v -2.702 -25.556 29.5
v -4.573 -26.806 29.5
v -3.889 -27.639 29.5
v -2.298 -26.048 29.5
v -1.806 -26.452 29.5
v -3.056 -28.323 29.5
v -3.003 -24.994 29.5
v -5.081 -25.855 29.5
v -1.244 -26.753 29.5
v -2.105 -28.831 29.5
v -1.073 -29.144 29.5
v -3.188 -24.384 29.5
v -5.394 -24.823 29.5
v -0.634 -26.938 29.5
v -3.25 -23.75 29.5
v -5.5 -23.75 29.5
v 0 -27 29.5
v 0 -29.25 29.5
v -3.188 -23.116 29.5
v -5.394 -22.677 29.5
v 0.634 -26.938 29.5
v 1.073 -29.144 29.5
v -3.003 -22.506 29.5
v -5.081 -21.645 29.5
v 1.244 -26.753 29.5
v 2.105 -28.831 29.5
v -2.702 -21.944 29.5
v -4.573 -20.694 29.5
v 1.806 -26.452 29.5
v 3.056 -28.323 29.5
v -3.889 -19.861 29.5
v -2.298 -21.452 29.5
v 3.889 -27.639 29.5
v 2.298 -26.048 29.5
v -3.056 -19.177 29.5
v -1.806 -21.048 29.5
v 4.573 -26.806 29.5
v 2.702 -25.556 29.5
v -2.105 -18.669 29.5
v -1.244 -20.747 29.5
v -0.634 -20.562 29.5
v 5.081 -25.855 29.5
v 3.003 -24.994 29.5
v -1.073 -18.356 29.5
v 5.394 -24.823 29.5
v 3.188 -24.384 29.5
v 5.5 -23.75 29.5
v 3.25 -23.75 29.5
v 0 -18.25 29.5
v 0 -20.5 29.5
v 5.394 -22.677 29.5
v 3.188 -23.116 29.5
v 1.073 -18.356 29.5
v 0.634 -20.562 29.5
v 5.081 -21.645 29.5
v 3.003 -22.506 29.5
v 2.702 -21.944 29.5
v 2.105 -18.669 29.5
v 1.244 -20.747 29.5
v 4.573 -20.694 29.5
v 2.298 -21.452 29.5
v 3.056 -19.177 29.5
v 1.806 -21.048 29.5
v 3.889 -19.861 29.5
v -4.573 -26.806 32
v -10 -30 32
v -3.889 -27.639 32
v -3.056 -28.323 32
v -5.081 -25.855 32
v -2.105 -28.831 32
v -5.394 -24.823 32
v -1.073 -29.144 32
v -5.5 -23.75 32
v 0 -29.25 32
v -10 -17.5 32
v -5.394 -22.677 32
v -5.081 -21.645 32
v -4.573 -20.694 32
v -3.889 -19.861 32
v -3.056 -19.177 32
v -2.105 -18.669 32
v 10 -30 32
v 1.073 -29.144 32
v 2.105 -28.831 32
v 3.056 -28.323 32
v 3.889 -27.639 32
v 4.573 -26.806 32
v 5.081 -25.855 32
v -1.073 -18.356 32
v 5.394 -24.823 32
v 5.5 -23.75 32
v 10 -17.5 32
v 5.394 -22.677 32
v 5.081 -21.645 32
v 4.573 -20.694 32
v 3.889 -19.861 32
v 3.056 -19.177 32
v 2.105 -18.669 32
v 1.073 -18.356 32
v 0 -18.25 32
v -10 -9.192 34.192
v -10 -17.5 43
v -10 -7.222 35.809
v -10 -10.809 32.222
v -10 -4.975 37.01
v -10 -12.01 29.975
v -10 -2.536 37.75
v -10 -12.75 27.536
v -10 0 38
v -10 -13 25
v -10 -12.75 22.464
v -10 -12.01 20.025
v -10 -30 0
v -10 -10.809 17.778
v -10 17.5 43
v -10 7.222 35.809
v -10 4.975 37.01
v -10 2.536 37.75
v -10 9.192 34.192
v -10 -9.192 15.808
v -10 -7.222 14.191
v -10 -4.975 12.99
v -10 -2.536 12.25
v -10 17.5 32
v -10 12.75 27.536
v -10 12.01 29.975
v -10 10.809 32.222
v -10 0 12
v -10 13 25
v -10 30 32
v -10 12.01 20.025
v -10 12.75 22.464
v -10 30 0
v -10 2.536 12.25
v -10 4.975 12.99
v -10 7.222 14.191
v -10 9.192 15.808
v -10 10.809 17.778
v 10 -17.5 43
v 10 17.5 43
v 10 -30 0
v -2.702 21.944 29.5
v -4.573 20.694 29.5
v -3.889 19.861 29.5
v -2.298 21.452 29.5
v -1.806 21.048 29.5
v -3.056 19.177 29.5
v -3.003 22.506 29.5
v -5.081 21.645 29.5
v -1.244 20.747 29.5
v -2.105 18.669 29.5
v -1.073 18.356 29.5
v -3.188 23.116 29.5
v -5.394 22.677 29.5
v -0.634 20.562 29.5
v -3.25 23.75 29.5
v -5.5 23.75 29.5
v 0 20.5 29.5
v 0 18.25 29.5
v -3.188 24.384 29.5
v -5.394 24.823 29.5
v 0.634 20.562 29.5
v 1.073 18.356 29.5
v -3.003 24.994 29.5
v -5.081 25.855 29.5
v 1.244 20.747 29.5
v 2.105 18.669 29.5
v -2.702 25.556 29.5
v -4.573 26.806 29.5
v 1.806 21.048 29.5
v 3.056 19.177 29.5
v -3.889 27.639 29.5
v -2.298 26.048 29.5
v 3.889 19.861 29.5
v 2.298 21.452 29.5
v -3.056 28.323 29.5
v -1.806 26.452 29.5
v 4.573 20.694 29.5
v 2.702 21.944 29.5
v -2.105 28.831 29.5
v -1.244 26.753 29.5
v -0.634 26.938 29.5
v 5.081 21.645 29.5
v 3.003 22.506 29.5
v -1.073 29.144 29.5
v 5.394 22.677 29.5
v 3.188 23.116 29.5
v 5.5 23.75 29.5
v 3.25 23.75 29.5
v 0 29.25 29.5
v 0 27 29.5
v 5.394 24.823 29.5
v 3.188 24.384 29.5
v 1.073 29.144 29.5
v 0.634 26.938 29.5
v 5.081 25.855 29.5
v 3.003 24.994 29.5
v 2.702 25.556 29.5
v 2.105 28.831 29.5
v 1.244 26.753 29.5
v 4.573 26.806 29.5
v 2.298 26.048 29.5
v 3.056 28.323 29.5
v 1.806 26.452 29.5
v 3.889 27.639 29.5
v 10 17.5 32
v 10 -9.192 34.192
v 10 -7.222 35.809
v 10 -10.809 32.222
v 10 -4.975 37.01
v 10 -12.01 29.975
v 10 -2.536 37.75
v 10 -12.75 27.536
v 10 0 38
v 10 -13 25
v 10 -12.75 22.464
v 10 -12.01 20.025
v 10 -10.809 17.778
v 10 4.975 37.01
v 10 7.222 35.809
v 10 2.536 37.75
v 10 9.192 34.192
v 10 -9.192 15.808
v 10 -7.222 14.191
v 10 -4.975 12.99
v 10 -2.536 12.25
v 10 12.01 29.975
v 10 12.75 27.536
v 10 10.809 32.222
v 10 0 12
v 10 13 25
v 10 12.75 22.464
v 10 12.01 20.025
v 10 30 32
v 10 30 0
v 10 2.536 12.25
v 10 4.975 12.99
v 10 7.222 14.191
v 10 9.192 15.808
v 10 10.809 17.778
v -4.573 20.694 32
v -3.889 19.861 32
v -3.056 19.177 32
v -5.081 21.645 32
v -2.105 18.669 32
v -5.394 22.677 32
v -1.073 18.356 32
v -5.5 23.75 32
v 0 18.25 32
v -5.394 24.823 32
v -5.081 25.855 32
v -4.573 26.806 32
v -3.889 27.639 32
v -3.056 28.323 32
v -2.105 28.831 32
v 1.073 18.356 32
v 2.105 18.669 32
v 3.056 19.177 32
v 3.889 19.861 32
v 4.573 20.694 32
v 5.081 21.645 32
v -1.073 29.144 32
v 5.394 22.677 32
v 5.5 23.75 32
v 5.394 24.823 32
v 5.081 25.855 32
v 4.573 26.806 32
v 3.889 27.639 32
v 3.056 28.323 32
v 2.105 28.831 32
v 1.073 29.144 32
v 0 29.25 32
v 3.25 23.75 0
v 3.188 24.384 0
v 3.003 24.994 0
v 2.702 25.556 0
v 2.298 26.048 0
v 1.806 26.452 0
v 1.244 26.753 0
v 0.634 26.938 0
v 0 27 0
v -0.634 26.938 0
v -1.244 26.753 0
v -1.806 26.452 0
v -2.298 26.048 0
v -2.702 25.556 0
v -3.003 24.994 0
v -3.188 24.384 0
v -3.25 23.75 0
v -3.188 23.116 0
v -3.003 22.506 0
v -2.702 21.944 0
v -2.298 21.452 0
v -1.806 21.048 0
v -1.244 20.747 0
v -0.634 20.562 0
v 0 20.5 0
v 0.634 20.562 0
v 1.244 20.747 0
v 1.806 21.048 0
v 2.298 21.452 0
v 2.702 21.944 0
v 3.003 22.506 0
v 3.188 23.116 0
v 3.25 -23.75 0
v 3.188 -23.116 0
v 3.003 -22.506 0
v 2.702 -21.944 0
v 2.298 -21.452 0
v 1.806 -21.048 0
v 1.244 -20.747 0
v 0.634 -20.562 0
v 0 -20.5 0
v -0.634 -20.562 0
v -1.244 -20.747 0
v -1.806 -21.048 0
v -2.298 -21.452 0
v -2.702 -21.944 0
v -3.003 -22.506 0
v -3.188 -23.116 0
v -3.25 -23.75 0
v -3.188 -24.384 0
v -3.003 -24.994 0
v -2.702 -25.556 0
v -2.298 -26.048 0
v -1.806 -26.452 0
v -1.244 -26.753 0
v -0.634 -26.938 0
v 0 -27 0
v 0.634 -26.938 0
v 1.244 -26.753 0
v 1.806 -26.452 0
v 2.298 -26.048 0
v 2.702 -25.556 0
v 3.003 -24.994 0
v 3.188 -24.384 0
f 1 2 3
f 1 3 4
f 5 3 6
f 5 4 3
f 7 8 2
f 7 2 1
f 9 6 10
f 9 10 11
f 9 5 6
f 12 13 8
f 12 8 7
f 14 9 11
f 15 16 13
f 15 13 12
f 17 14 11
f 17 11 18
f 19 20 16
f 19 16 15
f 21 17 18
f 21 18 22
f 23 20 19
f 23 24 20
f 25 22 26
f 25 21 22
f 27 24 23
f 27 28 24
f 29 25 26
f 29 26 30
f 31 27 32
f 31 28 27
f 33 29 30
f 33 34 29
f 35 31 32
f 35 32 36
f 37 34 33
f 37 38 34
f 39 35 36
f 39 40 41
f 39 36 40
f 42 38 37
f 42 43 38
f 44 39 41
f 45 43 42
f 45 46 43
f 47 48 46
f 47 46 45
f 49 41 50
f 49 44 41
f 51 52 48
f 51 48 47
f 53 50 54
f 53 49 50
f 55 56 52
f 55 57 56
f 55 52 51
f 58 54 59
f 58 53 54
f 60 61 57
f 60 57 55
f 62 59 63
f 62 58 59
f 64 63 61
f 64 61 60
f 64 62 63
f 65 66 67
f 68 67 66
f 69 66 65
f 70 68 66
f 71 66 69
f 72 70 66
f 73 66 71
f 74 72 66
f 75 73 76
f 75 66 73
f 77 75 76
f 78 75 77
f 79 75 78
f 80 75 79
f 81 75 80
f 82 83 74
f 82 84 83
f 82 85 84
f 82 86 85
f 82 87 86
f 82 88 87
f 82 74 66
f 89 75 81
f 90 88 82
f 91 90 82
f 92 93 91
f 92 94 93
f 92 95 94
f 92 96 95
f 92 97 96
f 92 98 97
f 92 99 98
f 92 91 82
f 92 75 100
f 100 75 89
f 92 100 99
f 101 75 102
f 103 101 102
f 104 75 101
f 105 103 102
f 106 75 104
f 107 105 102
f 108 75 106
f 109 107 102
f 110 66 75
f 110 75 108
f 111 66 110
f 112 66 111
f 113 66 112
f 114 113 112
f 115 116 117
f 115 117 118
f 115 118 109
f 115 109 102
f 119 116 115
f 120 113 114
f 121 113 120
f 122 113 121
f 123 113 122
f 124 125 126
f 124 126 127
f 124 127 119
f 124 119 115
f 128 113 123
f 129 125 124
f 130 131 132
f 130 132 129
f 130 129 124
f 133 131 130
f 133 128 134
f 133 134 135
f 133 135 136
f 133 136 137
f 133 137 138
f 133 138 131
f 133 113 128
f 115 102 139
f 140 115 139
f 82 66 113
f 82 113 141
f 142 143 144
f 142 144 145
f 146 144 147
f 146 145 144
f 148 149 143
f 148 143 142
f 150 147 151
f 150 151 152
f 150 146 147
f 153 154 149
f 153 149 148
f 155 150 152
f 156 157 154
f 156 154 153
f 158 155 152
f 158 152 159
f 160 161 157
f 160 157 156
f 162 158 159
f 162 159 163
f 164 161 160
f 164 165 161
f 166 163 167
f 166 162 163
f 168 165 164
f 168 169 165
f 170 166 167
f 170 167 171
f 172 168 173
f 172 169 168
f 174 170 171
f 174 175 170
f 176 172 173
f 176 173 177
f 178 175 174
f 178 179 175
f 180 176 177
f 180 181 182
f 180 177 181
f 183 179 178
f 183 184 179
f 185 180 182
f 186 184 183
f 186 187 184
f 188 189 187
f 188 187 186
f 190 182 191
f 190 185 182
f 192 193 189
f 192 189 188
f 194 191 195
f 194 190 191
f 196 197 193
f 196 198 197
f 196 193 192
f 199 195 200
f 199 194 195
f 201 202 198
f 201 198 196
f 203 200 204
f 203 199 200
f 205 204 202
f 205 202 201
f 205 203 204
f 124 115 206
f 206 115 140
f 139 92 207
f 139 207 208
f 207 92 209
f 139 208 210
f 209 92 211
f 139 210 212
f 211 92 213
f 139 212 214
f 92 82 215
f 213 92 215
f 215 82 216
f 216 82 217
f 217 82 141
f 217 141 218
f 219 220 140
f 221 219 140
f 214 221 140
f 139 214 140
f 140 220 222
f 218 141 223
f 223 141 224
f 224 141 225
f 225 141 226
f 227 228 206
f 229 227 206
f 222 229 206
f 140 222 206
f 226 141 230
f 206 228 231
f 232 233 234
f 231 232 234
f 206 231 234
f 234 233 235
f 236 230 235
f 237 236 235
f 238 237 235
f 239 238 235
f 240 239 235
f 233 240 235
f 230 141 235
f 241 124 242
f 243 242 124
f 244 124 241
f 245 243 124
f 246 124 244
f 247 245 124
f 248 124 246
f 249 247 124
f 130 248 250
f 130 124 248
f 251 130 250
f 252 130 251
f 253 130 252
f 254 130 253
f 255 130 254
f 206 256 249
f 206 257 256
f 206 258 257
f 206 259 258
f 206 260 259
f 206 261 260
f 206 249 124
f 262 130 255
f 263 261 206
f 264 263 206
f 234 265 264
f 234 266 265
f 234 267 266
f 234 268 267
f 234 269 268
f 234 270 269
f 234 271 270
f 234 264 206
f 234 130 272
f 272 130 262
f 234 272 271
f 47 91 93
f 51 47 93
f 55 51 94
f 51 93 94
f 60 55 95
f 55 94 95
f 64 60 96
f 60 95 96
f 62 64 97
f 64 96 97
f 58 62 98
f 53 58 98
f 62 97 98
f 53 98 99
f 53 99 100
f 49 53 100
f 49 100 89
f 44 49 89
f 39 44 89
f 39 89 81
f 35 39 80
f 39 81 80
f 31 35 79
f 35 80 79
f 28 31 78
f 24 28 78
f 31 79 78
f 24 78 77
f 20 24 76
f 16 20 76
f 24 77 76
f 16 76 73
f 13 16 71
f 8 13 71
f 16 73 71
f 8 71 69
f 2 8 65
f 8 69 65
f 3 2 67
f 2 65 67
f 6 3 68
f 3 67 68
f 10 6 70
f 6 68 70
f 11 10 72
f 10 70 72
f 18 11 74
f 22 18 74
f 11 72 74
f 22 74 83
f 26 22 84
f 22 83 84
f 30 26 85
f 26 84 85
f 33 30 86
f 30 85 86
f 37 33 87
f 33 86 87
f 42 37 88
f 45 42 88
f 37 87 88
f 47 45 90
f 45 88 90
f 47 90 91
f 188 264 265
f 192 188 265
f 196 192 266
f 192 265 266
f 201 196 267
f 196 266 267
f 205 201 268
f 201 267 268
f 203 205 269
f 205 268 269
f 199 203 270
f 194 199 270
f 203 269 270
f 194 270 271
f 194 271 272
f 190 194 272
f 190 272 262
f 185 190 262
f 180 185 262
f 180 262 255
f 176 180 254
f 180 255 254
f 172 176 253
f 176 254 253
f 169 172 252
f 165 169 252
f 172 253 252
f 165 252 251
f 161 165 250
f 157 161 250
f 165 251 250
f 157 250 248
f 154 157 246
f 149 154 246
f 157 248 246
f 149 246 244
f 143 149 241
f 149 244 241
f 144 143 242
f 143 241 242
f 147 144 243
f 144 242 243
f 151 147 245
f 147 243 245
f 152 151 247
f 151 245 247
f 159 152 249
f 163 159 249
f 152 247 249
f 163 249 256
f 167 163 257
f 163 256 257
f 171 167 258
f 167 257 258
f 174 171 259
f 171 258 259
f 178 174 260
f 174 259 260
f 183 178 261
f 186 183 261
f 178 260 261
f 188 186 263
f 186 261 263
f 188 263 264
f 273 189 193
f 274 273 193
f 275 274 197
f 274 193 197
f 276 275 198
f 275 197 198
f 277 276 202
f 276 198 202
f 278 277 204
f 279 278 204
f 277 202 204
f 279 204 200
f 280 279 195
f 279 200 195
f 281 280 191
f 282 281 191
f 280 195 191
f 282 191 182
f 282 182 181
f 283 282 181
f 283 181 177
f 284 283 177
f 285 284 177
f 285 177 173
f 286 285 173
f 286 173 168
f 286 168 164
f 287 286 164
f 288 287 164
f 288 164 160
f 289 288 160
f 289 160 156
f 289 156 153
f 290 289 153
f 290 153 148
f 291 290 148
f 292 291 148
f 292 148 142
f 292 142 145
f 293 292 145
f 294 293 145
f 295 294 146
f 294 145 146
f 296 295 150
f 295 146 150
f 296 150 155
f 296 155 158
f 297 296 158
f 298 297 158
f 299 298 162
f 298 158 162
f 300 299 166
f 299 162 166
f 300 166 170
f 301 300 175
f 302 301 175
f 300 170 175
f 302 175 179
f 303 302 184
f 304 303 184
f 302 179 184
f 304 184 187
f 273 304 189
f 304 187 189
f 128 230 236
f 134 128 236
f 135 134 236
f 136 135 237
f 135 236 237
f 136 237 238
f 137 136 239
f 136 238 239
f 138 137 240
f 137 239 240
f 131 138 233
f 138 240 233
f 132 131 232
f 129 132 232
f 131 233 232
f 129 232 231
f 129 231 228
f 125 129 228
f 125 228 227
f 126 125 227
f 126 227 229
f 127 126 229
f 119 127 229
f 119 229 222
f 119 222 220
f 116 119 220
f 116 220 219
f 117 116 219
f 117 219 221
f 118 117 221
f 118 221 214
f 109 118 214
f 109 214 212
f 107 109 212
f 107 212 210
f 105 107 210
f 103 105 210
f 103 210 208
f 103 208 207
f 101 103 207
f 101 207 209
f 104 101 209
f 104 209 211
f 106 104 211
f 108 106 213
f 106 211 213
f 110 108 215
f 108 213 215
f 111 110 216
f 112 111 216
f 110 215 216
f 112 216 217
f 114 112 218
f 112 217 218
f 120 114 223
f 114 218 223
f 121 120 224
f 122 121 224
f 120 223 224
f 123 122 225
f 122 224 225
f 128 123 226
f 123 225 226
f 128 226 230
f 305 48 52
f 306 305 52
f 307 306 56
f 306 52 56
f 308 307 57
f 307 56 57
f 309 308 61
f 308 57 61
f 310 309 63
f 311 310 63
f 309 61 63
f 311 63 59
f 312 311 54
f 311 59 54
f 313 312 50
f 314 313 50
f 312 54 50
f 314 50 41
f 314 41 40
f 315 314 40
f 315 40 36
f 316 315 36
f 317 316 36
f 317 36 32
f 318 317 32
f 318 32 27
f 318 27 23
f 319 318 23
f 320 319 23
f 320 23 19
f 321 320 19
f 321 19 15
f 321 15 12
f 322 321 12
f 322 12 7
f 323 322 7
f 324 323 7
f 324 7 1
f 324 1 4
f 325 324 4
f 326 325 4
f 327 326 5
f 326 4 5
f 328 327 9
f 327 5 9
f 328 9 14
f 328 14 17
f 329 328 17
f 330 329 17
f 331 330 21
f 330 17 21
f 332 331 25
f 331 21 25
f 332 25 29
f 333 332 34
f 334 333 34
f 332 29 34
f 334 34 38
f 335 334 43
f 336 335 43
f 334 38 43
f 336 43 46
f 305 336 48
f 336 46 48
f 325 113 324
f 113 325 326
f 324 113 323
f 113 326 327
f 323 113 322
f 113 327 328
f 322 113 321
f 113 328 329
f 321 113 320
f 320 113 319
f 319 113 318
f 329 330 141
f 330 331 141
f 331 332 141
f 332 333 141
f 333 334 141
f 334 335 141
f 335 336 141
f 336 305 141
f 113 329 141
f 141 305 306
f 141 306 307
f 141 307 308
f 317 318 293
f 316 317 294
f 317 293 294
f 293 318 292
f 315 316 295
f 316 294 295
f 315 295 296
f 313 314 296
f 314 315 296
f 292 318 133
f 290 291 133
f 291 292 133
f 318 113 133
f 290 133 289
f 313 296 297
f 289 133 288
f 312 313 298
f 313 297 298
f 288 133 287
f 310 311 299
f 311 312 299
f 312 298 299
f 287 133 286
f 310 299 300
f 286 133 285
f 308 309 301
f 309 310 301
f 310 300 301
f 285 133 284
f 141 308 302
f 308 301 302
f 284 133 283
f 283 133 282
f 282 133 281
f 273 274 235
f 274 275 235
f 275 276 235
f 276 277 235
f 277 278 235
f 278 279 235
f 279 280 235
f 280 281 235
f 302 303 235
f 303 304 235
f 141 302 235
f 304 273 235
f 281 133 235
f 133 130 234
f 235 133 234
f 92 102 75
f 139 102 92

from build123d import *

# Parameters (mm, degrees)
SKETCH1_W           = 20
SKETCH1_H           = 60
BOSS_EXTRUDE1_DEPTH = 43
SKETCH2_W           = 20
SKETCH2_H           = 12.5
CUT_EXTRUDE1_DEPTH  = 11
SKETCH3_R           = 3.25
CUT_EXTRUDE2_DEPTH  = 33
SKETCH4_R           = 5.5
CUT_EXTRUDE3_DEPTH  = 2.5
SKETCH5_R           = 13
CUT_EXTRUDE4_DEPTH  = 21


with BuildPart() as part:
    # Sketch1 → Boss-Extrude1 (new body)
    with BuildSketch(Plane.XY):
        Rectangle(SKETCH1_W, SKETCH1_H)
    extrude(amount=BOSS_EXTRUDE1_DEPTH)

    # Sketch2 → Cut-Extrude1 (cut)
    with BuildSketch(Plane.XY.offset(43)):
        with Locations((0, -23.75)):
            Rectangle(SKETCH2_W, SKETCH2_H)
        with Locations((0, 23.75)):
            Rectangle(SKETCH2_W, SKETCH2_H)
    extrude(amount=-CUT_EXTRUDE1_DEPTH, mode=Mode.SUBTRACT)

    # Sketch3 → Cut-Extrude2 (cut, through all)
    with BuildSketch(Plane.XY.offset(32)):
        with Locations((0, -23.75)):
            Circle(SKETCH3_R)
        with Locations((0, 23.75)):
            Circle(SKETCH3_R)
    extrude(amount=-CUT_EXTRUDE2_DEPTH, mode=Mode.SUBTRACT)

    # Sketch4 → Cut-Extrude3 (cut)
    with BuildSketch(Plane.XY.offset(32)):
        with Locations((0, -23.75)):
            Circle(SKETCH4_R)
        with Locations((0, 23.75)):
            Circle(SKETCH4_R)
    extrude(amount=-CUT_EXTRUDE3_DEPTH, mode=Mode.SUBTRACT)

    # Sketch5 → Cut-Extrude4 (cut, through all)
    with BuildSketch(Plane(origin=(10, 0, 0), x_dir=(0, 0, -1), z_dir=(1, 0, 0))):
        with Locations((-25, 0)):
            Circle(SKETCH5_R)
    extrude(amount=-CUT_EXTRUDE4_DEPTH, mode=Mode.SUBTRACT)


solid = part.part
